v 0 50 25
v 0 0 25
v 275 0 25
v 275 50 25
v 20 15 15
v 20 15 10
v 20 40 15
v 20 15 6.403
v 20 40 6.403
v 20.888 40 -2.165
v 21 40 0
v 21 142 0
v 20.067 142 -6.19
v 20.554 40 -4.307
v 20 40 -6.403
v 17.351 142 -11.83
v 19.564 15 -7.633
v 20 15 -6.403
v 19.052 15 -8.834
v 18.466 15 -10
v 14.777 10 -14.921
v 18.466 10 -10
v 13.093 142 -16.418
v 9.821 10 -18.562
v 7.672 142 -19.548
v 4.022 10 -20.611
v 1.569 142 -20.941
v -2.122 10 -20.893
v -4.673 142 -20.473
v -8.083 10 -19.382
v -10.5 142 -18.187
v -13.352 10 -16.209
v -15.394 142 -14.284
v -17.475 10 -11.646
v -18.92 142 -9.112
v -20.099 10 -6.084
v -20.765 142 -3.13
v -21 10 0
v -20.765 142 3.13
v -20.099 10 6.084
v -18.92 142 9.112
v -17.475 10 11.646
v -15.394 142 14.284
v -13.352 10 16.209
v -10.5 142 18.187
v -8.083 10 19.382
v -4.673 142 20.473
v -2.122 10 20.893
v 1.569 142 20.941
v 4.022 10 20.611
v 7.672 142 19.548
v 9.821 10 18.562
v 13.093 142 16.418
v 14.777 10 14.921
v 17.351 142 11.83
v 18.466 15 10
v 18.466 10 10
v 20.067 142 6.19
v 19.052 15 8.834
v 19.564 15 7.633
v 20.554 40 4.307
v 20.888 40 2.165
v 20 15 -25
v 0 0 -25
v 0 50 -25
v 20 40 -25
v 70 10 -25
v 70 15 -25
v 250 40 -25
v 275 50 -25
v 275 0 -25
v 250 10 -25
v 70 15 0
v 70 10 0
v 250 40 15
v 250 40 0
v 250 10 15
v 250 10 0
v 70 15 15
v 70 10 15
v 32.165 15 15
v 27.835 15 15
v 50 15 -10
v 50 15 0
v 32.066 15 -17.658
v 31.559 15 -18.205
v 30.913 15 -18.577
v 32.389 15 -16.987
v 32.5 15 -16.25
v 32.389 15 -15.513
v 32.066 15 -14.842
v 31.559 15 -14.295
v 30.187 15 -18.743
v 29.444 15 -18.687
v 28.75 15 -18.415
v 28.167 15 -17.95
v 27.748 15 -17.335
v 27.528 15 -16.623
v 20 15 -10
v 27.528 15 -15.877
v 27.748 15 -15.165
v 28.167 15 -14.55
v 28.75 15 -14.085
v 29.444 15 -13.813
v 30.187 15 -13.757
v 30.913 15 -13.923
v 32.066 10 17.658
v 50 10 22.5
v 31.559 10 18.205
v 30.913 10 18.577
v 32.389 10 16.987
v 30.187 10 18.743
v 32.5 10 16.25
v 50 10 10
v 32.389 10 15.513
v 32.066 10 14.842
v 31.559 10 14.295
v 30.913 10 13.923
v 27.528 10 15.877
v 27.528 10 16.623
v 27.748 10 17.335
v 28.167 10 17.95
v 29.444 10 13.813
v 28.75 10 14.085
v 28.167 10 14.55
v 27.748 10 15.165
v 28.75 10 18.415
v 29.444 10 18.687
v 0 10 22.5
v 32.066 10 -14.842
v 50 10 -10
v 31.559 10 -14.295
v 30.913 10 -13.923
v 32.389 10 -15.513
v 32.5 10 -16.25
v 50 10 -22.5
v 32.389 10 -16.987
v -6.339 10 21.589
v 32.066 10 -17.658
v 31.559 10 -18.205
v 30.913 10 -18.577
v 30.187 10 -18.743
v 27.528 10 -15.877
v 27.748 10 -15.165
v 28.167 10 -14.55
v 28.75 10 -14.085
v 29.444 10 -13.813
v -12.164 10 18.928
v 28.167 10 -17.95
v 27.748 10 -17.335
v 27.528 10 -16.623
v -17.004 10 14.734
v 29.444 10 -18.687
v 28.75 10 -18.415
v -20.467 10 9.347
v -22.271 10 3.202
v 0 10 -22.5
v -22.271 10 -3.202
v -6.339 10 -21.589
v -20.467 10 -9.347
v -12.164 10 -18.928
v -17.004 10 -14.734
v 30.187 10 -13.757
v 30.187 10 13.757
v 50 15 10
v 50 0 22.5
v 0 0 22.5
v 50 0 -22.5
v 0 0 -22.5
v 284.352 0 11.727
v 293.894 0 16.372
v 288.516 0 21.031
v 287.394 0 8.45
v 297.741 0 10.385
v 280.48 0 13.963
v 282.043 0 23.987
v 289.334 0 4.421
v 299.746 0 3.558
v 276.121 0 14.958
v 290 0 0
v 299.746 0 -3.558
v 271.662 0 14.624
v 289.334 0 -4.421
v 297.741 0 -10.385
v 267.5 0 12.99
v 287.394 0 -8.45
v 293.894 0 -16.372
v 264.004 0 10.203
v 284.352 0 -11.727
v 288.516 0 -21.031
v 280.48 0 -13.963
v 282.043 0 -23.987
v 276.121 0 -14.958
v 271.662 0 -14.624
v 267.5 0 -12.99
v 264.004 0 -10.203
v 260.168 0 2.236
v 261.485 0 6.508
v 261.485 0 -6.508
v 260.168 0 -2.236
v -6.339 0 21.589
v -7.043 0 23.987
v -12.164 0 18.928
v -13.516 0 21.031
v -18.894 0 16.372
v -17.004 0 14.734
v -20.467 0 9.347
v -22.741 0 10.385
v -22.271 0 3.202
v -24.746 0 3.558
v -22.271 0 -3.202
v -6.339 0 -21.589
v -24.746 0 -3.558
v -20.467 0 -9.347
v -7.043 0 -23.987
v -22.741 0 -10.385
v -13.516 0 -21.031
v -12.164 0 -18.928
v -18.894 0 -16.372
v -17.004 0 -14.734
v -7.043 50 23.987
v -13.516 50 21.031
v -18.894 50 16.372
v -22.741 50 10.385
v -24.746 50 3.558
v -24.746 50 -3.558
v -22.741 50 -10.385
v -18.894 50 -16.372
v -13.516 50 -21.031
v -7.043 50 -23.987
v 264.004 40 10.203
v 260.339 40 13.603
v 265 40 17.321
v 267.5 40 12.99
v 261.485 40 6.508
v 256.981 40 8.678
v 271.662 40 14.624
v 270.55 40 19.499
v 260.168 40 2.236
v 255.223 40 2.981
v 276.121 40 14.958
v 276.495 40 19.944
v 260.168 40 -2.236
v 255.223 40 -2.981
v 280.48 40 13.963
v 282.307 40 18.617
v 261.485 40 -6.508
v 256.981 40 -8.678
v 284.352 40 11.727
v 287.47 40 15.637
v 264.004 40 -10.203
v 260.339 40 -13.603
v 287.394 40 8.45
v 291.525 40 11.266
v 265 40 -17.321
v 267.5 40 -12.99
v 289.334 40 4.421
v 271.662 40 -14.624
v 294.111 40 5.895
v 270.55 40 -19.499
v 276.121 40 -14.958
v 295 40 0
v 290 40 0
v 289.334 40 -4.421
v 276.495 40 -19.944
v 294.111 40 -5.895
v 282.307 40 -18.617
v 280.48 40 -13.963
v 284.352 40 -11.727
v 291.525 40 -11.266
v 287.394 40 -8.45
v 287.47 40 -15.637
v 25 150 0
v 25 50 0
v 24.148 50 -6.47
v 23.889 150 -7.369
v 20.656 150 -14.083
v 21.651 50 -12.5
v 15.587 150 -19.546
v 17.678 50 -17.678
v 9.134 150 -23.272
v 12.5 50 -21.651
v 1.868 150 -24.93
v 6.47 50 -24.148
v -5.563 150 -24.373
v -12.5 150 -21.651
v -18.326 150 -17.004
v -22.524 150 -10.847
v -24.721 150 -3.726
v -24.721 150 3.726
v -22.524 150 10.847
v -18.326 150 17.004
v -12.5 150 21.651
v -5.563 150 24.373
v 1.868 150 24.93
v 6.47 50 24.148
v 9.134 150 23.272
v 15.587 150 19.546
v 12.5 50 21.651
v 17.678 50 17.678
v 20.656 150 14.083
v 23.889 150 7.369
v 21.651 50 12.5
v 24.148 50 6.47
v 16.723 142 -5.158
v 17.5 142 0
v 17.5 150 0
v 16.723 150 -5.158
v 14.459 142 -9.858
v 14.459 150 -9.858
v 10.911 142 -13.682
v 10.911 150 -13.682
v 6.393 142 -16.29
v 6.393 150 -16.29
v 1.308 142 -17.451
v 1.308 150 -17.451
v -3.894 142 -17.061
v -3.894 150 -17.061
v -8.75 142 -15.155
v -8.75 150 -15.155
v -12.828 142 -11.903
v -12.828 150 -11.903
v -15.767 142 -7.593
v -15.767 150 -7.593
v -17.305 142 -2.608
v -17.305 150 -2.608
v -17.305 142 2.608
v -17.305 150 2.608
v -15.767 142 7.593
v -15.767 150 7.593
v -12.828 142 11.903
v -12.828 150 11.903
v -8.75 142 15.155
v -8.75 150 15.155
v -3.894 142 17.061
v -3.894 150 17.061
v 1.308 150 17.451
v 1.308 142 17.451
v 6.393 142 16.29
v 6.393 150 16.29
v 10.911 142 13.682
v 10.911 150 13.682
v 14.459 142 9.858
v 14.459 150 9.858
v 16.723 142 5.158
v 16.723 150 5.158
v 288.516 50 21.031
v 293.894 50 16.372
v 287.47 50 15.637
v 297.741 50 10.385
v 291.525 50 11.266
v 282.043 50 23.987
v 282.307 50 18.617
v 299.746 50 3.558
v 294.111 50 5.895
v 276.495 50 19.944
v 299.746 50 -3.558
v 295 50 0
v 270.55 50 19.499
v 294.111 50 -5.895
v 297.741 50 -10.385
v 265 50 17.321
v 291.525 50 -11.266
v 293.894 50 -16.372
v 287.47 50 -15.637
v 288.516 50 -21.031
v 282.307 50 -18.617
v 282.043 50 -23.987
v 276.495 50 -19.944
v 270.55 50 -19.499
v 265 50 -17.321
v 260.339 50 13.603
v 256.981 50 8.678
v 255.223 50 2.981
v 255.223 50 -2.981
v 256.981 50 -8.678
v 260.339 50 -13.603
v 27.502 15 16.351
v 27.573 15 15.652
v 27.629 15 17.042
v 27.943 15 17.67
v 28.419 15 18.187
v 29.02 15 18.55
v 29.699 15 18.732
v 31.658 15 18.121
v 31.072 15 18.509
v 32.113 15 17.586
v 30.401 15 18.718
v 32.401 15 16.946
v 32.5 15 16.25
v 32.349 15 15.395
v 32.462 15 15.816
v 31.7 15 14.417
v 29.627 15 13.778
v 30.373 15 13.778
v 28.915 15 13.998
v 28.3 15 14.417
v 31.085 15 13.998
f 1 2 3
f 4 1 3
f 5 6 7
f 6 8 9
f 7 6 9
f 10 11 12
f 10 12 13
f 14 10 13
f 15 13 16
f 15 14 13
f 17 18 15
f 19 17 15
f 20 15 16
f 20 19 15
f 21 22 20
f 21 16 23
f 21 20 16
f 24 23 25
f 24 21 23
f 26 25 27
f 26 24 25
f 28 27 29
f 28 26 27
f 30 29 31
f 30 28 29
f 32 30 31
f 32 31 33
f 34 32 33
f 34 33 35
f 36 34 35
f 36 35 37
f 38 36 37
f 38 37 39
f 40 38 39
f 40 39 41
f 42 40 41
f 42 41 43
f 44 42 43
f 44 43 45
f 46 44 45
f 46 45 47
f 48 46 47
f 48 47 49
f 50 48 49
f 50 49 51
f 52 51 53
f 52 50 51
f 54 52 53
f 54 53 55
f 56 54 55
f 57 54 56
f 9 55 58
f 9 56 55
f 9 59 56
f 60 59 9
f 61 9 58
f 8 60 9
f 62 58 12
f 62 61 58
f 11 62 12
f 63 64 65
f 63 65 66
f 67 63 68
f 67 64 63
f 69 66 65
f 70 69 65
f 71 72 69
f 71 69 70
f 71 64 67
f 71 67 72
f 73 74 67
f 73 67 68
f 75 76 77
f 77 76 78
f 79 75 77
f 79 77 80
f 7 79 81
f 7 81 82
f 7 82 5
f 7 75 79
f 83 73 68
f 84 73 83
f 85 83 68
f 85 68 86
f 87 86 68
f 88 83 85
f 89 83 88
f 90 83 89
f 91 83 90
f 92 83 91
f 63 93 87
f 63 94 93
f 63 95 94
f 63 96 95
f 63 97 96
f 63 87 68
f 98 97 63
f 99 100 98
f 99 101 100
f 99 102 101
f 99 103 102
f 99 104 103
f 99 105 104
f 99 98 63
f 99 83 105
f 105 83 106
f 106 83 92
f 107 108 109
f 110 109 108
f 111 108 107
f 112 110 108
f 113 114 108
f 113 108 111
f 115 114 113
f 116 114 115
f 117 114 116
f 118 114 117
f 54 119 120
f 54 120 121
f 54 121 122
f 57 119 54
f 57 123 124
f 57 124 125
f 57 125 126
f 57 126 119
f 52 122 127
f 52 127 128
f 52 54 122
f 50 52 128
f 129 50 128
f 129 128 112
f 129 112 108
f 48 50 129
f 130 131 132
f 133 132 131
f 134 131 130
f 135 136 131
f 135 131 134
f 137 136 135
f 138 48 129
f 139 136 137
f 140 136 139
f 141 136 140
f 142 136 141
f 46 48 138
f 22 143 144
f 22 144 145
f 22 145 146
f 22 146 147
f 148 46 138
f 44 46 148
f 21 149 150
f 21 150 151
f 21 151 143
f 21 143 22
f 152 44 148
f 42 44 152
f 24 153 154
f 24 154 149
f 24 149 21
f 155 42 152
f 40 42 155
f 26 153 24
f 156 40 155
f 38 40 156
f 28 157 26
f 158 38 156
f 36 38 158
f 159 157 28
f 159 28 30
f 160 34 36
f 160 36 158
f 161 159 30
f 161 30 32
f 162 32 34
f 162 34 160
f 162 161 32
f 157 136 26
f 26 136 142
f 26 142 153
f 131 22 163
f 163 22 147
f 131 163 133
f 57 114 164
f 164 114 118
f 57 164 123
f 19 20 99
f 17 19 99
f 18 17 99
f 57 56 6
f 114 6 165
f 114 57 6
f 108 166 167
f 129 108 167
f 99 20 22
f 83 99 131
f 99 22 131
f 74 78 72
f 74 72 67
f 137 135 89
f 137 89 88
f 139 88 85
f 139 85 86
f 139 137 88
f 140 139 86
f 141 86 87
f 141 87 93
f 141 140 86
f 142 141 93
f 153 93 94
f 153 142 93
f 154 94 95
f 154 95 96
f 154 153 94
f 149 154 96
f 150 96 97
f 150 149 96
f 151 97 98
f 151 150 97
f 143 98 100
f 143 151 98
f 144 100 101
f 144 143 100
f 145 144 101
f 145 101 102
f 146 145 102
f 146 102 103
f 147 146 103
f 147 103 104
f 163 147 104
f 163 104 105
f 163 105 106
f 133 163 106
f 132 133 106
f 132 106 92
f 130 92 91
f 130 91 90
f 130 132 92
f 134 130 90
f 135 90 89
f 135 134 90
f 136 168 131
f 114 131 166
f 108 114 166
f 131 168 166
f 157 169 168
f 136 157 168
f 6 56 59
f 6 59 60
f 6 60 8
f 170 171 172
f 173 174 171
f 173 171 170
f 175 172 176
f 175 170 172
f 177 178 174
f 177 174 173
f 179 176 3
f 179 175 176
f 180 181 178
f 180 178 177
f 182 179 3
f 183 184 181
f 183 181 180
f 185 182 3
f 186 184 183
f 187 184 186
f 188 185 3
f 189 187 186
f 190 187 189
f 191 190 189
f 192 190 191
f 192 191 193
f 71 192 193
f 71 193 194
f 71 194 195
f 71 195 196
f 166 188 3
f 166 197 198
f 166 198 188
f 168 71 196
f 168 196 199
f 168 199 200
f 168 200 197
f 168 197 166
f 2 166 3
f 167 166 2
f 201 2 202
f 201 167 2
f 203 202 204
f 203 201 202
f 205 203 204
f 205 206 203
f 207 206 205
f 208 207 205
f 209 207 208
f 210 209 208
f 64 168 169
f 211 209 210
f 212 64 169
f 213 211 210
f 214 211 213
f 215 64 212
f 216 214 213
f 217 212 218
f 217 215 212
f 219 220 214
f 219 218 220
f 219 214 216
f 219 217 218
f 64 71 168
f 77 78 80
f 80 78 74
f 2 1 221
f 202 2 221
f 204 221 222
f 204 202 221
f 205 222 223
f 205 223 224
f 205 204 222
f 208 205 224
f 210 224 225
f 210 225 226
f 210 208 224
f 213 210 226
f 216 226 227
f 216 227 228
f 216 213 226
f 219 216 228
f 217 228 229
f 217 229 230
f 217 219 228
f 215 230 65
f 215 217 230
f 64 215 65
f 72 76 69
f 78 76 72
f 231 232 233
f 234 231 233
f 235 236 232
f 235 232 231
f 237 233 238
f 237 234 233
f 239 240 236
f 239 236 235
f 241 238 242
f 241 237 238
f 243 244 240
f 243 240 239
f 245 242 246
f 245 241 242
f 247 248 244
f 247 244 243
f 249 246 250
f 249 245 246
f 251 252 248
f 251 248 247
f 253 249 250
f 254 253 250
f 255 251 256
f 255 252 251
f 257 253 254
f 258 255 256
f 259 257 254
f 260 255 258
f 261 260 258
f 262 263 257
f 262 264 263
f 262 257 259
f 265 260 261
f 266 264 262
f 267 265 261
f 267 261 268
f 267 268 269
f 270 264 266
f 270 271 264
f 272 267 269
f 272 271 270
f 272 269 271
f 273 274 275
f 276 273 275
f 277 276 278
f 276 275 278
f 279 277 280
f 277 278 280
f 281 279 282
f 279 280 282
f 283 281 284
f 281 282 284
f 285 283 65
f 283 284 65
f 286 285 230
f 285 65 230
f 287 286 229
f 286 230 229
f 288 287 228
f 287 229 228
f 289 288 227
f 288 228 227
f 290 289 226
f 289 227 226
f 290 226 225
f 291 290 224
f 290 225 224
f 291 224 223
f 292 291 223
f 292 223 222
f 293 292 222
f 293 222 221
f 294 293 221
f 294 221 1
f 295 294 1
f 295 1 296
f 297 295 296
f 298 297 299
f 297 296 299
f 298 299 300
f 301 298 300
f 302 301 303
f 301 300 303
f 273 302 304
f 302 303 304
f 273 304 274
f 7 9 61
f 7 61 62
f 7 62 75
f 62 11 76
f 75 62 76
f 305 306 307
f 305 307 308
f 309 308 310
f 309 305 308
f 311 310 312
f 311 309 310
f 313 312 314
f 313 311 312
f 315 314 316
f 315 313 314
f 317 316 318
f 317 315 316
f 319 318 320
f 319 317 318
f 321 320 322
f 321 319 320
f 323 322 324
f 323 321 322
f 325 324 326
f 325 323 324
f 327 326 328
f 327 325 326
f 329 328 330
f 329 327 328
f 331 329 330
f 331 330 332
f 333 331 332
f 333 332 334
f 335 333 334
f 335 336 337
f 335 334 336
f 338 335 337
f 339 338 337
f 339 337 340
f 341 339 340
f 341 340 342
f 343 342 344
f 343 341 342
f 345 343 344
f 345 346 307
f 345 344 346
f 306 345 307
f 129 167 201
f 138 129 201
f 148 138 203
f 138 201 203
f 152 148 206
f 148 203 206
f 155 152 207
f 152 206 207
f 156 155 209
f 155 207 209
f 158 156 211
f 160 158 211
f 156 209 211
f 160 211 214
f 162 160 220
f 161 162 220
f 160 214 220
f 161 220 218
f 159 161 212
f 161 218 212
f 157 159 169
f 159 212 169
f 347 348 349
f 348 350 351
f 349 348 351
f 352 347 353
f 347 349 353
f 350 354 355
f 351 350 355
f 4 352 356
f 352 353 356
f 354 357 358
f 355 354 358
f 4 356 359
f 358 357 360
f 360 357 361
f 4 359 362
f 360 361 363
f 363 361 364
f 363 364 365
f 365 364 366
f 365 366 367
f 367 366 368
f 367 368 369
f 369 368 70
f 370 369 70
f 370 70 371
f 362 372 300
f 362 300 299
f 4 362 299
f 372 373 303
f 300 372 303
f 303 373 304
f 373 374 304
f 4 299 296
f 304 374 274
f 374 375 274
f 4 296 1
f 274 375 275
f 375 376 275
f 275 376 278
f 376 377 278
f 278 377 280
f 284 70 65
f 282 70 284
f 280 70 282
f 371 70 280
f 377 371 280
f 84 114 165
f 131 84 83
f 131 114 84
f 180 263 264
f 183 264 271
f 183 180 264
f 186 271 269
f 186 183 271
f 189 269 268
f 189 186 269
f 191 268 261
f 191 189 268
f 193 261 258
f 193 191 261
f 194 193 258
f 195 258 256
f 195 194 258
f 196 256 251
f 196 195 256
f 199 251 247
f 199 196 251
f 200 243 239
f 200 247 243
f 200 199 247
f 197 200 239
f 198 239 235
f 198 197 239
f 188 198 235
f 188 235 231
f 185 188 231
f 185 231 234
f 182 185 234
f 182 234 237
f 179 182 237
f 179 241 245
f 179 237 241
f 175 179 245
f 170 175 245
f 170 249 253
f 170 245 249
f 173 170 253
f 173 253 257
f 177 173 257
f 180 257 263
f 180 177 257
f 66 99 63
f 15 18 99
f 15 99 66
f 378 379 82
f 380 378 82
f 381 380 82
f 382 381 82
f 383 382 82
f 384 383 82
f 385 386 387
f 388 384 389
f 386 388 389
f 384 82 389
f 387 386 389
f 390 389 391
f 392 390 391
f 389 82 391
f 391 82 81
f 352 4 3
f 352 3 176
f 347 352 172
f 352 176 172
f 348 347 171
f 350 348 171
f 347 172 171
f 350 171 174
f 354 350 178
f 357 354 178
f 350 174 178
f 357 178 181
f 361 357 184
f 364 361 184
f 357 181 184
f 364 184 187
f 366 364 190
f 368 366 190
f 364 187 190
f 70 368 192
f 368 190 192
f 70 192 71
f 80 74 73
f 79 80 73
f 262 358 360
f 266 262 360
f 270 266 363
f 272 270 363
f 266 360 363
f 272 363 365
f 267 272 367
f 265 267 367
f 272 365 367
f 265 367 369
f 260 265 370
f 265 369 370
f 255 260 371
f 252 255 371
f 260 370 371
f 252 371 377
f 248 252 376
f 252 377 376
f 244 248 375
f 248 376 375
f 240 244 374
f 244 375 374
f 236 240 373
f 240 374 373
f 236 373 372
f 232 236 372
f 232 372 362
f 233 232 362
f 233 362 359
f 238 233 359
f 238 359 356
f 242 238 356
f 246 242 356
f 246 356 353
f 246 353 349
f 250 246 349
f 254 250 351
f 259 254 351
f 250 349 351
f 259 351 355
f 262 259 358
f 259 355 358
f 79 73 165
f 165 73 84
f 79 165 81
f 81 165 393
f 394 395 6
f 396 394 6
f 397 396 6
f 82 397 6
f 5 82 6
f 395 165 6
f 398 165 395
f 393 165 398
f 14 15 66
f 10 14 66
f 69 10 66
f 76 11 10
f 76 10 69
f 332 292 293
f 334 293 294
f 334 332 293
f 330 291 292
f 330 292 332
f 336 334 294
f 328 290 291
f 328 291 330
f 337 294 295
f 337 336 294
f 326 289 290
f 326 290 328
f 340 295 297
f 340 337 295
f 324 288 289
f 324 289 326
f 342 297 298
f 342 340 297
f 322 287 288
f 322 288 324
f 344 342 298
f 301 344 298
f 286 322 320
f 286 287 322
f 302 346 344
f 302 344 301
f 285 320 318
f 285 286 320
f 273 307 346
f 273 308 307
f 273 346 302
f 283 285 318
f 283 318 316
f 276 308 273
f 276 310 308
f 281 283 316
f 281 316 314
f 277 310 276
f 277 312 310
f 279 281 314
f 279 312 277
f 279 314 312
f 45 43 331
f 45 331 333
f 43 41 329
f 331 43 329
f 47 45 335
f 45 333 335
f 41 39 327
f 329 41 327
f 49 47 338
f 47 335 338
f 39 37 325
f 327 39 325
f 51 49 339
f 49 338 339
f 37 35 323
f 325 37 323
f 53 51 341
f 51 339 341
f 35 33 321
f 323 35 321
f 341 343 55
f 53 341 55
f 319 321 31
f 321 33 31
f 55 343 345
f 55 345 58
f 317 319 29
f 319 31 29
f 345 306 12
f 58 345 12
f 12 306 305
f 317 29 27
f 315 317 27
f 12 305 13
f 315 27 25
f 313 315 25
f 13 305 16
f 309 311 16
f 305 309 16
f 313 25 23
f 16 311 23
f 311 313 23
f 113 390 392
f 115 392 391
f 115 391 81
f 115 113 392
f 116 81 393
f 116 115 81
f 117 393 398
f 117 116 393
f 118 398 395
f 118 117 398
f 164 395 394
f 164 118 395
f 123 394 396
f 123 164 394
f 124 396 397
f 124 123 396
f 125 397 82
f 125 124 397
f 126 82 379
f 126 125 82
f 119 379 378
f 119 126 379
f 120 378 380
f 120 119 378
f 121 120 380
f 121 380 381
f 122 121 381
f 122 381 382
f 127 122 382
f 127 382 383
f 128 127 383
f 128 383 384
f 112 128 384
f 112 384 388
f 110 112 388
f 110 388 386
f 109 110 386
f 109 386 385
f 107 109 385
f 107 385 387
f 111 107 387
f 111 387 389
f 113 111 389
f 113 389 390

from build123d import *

# Parameters (mm, degrees)
RECTWITHARC_W              = 275
RECTWITHARC_H              = 50
ARMBASE_DEPTH              = 50
ARMCOLLAR_START            = 50
SKETCH5_R                  = 25
ARMCOLLAR_DEPTH            = 100
CUT_EXTRUDE1_REACH         = 152
SHAFTKEY_R                 = 17.5
HOLLOWMIDDLE_DEPTH         = 15
HOLLOWMIDDLE_DEPTH_BACK    = 26
J2SHAFTHOLE_R              = 15
JOINT2SHAFTHOLE_DEPTH      = 151
JOINT2SHAFTHOLE_DEPTH_BACK = 10
J2SHAFTCOUNTERSINK_START   = 50
SKETCH4_R                  = 20
J2SHAFTCOUNTERSINK_DEPTH   = 10
SKETCH6_R                  = 21
INNERDIAMETER_DEPTH        = 142
CUT_EXTRUDE11_DEPTH        = 10
CUT_EXTRUDE12_START        = 10
SKETCH9_W                  = 50
SKETCH9_H                  = 20
CUT_EXTRUDE12_DEPTH        = 5
CUT_EXTRUDE13_START        = 10
SKETCH11_R                 = 2.5
CUT_EXTRUDE13_DEPTH        = 5


with BuildPart() as part:
    # RectwithArc → ArmBase (new body)
    with BuildSketch(Plane(origin=(0, 0, 0), x_dir=(1, 0, 0), z_dir=(0, 1, 0))):
        with BuildLine():
            ThreePointArc((0, -25), (-25, 0), (0, 25))
            Line((0, 25), (0, -25))
        make_face()
        with Locations((137.5, 0)):
            Rectangle(RECTWITHARC_W, RECTWITHARC_H)
        with BuildLine():
            Line((275, 25), (275, -25))
            ThreePointArc((275, -25), (300, 0), (275, 25))
        make_face()
    extrude(amount=ARMBASE_DEPTH)

    # Sketch5 → ArmCollar (add)
    with BuildSketch(Plane(origin=(0, 0, 0), x_dir=(1, 0, 0), z_dir=(0, 1, 0)).offset(ARMCOLLAR_START)):
        Circle(SKETCH5_R)
    extrude(amount=ARMCOLLAR_DEPTH)

    # ShaftKey → Cut-Extrude1 (cut, up to next)
    with BuildSketch(Plane(origin=(0, 0, 0), x_dir=(1, 0, 0), z_dir=(0, 1, 0)), mode=Mode.PRIVATE) as cut_extrude1_sk1:
        Circle(SHAFTKEY_R)
    cut_extrude1_tool1 = extrude(cut_extrude1_sk1.sketch, amount=CUT_EXTRUDE1_REACH, mode=Mode.PRIVATE) & part.part
    add(cut_extrude1_tool1.solids().sort_by_distance((0, 0, 0))[0], mode=Mode.SUBTRACT)

    # Sketch1 → HollowMIddle (cut, two sides)
    with BuildSketch(Plane.XY) as hollowmiddle_sk:
        Polygon((20, 40), (250, 40), (250, 10), (70, 10), (70, 15), (20, 15), align=None)
    extrude(amount=HOLLOWMIDDLE_DEPTH, mode=Mode.SUBTRACT)
    extrude(hollowmiddle_sk.sketch, amount=-HOLLOWMIDDLE_DEPTH_BACK, mode=Mode.SUBTRACT)

    # J2ShaftHole → Joint2ShaftHole (cut, two sides)
    with BuildSketch(Plane(origin=(0, 0, 0), x_dir=(1, 0, 0), z_dir=(0, 1, 0))) as joint2shafthole_sk:
        with Locations((275, 0)):
            Circle(J2SHAFTHOLE_R)
    extrude(amount=JOINT2SHAFTHOLE_DEPTH, mode=Mode.SUBTRACT)
    extrude(joint2shafthole_sk.sketch, amount=-JOINT2SHAFTHOLE_DEPTH_BACK, mode=Mode.SUBTRACT)

    # Sketch4 → J2ShaftCounterSink (cut)
    with BuildSketch(Plane(origin=(0, 0, 0), x_dir=(1, 0, 0), z_dir=(0, 1, 0)).offset(J2SHAFTCOUNTERSINK_START)):
        with Locations((275, 0)):
            Circle(SKETCH4_R)
    extrude(amount=-J2SHAFTCOUNTERSINK_DEPTH, mode=Mode.SUBTRACT)

    # Sketch6 → InnerDiameter (cut)
    with BuildSketch(Plane(origin=(0, 0, 0), x_dir=(1, 0, 0), z_dir=(0, 1, 0))):
        Circle(SKETCH6_R)
    extrude(amount=INNERDIAMETER_DEPTH, mode=Mode.SUBTRACT)

    # Sketch10 → Cut-Extrude11 (cut)
    with BuildSketch(Plane(origin=(0, 0, 0), x_dir=(1, 0, 0), z_dir=(0, 1, 0))):
        with BuildLine():
            Line((0, 22.5), (50, 22.5))
            Line((50, 22.5), (50, -22.5))
            Line((50, -22.5), (0, -22.5))
            ThreePointArc((0, -22.5), (-22.5, 0), (0, 22.5))
        make_face()
    extrude(amount=CUT_EXTRUDE11_DEPTH, mode=Mode.SUBTRACT)

    # Sketch9 → Cut-Extrude12 (cut)
    with BuildSketch(Plane(origin=(0, 0, 0), x_dir=(1, 0, 0), z_dir=(0, 1, 0)).offset(CUT_EXTRUDE12_START)):
        with Locations((25, 0)):
            Rectangle(SKETCH9_W, SKETCH9_H)
    extrude(amount=CUT_EXTRUDE12_DEPTH, mode=Mode.SUBTRACT)

    # Sketch11 → Cut-Extrude13 (cut)
    with BuildSketch(Plane(origin=(0, 0, 0), x_dir=(1, 0, 0), z_dir=(0, 1, 0)).offset(CUT_EXTRUDE13_START)):
        with Locations((30, 16.25)):
            Circle(SKETCH11_R)
        with Locations((30, -16.25)):
            Circle(SKETCH11_R)
    extrude(amount=CUT_EXTRUDE13_DEPTH, mode=Mode.SUBTRACT)


solid = part.part
